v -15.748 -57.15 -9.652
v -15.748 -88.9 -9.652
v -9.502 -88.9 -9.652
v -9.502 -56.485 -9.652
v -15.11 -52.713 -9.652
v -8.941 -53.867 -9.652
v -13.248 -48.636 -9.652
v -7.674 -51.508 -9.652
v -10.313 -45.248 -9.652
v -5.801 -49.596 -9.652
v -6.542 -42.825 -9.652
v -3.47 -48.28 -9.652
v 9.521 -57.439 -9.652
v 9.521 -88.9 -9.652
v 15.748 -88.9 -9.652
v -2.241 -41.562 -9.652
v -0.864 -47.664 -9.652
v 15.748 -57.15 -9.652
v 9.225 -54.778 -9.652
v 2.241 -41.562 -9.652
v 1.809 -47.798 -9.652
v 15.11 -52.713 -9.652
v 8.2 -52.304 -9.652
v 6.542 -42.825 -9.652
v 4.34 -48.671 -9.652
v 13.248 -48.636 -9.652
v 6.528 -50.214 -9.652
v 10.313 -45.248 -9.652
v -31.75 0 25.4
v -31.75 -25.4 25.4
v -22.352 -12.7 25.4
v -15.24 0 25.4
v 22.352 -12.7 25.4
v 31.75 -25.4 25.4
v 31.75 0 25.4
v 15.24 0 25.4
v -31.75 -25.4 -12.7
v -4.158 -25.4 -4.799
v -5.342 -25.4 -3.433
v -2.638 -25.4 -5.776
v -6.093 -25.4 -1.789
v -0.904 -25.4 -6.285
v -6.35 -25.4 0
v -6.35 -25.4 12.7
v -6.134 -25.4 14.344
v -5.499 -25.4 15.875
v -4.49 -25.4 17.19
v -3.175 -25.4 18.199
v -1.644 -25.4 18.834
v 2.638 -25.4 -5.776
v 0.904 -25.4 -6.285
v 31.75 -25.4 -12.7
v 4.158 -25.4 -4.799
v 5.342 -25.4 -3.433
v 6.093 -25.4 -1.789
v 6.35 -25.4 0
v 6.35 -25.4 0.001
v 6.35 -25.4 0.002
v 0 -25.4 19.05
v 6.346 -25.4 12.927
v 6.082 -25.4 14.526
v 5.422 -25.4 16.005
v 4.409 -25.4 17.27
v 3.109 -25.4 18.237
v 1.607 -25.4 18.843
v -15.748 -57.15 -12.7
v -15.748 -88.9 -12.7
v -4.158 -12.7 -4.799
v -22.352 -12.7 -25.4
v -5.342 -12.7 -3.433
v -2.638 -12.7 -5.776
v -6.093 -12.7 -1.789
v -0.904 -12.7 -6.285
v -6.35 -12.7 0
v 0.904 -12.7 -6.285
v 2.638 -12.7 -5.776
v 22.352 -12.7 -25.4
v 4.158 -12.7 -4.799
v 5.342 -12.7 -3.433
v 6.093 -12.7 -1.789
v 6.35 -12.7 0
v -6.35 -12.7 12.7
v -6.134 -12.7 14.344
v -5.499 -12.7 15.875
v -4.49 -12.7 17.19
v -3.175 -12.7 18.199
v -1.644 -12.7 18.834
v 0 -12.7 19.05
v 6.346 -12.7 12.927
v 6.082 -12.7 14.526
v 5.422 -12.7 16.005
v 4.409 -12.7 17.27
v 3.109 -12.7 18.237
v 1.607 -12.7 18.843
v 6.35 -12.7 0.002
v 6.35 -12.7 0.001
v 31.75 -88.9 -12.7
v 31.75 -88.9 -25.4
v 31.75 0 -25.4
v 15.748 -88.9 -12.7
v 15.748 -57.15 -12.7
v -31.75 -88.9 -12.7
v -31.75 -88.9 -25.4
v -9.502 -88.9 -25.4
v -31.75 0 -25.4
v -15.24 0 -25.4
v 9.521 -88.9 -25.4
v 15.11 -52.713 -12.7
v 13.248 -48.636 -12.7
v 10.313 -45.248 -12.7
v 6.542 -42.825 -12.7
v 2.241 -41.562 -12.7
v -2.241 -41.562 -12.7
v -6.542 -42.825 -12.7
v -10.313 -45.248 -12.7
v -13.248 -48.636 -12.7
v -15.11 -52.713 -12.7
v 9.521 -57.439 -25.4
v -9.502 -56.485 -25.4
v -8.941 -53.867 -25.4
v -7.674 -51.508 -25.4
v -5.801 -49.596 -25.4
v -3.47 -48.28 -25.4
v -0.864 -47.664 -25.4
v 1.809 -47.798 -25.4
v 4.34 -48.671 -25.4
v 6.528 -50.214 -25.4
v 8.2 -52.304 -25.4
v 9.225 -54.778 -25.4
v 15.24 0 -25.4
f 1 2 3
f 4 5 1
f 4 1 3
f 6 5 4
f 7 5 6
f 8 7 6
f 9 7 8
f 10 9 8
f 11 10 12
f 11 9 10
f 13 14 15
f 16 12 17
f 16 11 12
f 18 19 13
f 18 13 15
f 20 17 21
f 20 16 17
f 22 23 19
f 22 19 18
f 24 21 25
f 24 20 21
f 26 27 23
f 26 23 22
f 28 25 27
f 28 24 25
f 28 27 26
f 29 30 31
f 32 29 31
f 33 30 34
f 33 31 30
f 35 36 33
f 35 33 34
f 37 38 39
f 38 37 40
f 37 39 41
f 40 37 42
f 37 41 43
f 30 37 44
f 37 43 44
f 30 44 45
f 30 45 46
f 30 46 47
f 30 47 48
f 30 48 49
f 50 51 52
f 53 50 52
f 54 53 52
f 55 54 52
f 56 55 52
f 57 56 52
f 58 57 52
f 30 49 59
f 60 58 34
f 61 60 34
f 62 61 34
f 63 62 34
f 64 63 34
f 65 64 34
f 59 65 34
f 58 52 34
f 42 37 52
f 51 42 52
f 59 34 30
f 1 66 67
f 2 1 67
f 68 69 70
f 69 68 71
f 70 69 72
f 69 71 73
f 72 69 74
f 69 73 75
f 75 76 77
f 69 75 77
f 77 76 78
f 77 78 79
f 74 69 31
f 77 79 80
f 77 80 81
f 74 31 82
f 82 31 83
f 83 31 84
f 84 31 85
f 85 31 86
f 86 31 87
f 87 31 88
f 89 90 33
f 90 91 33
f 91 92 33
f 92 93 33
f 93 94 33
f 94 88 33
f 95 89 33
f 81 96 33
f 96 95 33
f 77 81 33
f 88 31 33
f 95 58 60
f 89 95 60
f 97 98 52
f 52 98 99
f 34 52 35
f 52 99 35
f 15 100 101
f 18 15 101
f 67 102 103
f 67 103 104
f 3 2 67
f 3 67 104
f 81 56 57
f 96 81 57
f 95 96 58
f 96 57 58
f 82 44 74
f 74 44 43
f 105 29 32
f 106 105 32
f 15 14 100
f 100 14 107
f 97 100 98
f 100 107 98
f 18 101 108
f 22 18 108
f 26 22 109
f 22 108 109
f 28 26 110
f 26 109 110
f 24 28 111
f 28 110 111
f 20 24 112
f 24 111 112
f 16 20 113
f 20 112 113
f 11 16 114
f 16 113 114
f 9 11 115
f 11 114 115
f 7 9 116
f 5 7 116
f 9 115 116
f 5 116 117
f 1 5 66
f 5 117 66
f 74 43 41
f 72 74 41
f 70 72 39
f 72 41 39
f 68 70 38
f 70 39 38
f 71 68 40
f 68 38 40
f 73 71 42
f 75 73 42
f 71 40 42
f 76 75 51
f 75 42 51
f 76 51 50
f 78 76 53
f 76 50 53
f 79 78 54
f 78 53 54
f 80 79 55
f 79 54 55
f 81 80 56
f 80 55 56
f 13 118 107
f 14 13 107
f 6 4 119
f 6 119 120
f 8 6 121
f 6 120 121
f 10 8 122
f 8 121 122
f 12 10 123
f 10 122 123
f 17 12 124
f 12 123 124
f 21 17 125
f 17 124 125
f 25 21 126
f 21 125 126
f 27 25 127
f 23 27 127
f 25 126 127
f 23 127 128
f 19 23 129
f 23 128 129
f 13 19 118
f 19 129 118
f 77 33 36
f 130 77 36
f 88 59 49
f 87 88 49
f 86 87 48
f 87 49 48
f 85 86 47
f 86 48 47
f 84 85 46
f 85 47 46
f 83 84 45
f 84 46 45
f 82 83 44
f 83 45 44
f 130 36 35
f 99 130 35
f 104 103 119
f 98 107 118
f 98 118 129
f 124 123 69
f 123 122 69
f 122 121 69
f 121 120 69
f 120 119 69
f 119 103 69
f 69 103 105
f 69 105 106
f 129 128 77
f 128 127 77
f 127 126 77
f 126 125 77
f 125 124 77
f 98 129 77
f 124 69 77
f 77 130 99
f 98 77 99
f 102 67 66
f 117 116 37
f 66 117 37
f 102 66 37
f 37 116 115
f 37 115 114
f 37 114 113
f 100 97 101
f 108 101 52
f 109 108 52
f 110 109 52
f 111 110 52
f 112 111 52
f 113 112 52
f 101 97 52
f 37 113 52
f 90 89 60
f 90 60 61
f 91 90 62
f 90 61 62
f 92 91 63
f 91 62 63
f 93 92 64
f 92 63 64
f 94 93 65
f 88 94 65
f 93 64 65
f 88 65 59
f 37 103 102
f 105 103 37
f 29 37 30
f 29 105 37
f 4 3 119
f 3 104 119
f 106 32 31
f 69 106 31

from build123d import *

# Parameters (mm, degrees)
F0_W      = 63.5
F0_H      = 50.8
F1_DEPTH  = 88.9
F2_W      = 63.5
F2_H      = 38.1
F3_DEPTH  = 63.501
F5_DEPTH  = 12.701
F7_DEPTH  = 3.048
F9_DEPTH  = 25.401
F11_DEPTH = 50.801


with BuildPart() as f1:
    # F0 (on Front) → F1 (new body)
    with BuildSketch(Plane.XZ):
        Rectangle(F0_W, F0_H)
    extrude(amount=F1_DEPTH)

    # F2 (on face) → F3 (cut, through all)
    with BuildSketch(Plane.YZ.offset(31.75)):
        with Locations((-57.15, 6.35)):
            Rectangle(F2_W, F2_H)
    extrude(amount=-F3_DEPTH, mode=Mode.SUBTRACT)

    # F4 (on face) → F5 (cut, through all)
    with BuildSketch(Plane.XY.offset(-12.7)):
        with BuildLine():
            Line((0, -88.9), (9.5206265251, -88.9))
            Line((9.5206265251, -88.9), (9.5206265251, -57.4386097176))
            ThreePointArc((9.5206265251, -57.4386097176), (0.4771367105, -47.6369581332), (-9.5017243728, -56.4845235209))
            Line((-9.5017243728, -56.4845235209), (-9.5017243728, -88.9))
            Line((-9.5017243728, -88.9), (0, -88.9))
        make_face()
    extrude(amount=-F5_DEPTH, mode=Mode.SUBTRACT)

    # F6 (on face) → F7 (join)
    with BuildSketch(Plane.XY.offset(-12.7)):
        with BuildLine():
            Line((15.748, -88.9), (15.748, -57.15))
            ThreePointArc((15.748, -57.15), (0, -41.402), (-15.748, -57.15))
            Line((-15.748, -57.15), (-15.748, -88.9))
            Line((-15.748, -88.9), (-9.5017243728, -88.9))
            Line((-9.5017243728, -88.9), (-9.5017243728, -56.4845235209))
            ThreePointArc((-9.5017243728, -56.4845235209), (0.4771367105, -47.6369581332), (9.5206265251, -57.4386097176))
            Line((9.5206265251, -57.4386097176), (9.5206265251, -88.9))
            Line((9.5206265251, -88.9), (15.748, -88.9))
        make_face()
    extrude(amount=F7_DEPTH)

    # F8 (on face) → F9 (cut, through all)
    with BuildSketch(Plane.XZ.offset(25.4)):
        with BuildLine():
            ThreePointArc((6.3459234426, 12.927498704), (4.4089615121, 17.2698532126), (0, 19.05))
            Line((0, 19.05), (0, 12.7))
            Line((0, 12.7), (-6.35, 12.7))
            Line((-6.35, 12.7), (-6.35, 0))
            ThreePointArc((-6.35, 0), (0, -6.35), (6.35, 0))
            ThreePointArc((6.35, 0), (6.3499999211, 0.001001282), (6.3499996842, 0.002002564))
            Line((6.3499996842, 0.002002564), (6.3459234426, 12.927498704))
        make_face()
        with BuildLine():
            Line((0, 12.7), (0, 19.05))
            ThreePointArc((0, 19.05), (-4.4901280605, 17.1901280605), (-6.35, 12.7))
            Line((-6.35, 12.7), (0, 12.7))
        make_face()
    extrude(amount=-F9_DEPTH, mode=Mode.SUBTRACT)

    # F10 (on face) → F11 (cut, through all)
    with BuildSketch(Plane.XY.offset(25.4)):
        Polygon((0, -12.7), (0, 0), (-15.24, 0), (-22.352, -12.7), align=None)
        Polygon((15.24, 0), (0, 0), (0, -12.7), (22.352, -12.7), align=None)
    extrude(amount=-F11_DEPTH, mode=Mode.SUBTRACT)


solid = f1.part
